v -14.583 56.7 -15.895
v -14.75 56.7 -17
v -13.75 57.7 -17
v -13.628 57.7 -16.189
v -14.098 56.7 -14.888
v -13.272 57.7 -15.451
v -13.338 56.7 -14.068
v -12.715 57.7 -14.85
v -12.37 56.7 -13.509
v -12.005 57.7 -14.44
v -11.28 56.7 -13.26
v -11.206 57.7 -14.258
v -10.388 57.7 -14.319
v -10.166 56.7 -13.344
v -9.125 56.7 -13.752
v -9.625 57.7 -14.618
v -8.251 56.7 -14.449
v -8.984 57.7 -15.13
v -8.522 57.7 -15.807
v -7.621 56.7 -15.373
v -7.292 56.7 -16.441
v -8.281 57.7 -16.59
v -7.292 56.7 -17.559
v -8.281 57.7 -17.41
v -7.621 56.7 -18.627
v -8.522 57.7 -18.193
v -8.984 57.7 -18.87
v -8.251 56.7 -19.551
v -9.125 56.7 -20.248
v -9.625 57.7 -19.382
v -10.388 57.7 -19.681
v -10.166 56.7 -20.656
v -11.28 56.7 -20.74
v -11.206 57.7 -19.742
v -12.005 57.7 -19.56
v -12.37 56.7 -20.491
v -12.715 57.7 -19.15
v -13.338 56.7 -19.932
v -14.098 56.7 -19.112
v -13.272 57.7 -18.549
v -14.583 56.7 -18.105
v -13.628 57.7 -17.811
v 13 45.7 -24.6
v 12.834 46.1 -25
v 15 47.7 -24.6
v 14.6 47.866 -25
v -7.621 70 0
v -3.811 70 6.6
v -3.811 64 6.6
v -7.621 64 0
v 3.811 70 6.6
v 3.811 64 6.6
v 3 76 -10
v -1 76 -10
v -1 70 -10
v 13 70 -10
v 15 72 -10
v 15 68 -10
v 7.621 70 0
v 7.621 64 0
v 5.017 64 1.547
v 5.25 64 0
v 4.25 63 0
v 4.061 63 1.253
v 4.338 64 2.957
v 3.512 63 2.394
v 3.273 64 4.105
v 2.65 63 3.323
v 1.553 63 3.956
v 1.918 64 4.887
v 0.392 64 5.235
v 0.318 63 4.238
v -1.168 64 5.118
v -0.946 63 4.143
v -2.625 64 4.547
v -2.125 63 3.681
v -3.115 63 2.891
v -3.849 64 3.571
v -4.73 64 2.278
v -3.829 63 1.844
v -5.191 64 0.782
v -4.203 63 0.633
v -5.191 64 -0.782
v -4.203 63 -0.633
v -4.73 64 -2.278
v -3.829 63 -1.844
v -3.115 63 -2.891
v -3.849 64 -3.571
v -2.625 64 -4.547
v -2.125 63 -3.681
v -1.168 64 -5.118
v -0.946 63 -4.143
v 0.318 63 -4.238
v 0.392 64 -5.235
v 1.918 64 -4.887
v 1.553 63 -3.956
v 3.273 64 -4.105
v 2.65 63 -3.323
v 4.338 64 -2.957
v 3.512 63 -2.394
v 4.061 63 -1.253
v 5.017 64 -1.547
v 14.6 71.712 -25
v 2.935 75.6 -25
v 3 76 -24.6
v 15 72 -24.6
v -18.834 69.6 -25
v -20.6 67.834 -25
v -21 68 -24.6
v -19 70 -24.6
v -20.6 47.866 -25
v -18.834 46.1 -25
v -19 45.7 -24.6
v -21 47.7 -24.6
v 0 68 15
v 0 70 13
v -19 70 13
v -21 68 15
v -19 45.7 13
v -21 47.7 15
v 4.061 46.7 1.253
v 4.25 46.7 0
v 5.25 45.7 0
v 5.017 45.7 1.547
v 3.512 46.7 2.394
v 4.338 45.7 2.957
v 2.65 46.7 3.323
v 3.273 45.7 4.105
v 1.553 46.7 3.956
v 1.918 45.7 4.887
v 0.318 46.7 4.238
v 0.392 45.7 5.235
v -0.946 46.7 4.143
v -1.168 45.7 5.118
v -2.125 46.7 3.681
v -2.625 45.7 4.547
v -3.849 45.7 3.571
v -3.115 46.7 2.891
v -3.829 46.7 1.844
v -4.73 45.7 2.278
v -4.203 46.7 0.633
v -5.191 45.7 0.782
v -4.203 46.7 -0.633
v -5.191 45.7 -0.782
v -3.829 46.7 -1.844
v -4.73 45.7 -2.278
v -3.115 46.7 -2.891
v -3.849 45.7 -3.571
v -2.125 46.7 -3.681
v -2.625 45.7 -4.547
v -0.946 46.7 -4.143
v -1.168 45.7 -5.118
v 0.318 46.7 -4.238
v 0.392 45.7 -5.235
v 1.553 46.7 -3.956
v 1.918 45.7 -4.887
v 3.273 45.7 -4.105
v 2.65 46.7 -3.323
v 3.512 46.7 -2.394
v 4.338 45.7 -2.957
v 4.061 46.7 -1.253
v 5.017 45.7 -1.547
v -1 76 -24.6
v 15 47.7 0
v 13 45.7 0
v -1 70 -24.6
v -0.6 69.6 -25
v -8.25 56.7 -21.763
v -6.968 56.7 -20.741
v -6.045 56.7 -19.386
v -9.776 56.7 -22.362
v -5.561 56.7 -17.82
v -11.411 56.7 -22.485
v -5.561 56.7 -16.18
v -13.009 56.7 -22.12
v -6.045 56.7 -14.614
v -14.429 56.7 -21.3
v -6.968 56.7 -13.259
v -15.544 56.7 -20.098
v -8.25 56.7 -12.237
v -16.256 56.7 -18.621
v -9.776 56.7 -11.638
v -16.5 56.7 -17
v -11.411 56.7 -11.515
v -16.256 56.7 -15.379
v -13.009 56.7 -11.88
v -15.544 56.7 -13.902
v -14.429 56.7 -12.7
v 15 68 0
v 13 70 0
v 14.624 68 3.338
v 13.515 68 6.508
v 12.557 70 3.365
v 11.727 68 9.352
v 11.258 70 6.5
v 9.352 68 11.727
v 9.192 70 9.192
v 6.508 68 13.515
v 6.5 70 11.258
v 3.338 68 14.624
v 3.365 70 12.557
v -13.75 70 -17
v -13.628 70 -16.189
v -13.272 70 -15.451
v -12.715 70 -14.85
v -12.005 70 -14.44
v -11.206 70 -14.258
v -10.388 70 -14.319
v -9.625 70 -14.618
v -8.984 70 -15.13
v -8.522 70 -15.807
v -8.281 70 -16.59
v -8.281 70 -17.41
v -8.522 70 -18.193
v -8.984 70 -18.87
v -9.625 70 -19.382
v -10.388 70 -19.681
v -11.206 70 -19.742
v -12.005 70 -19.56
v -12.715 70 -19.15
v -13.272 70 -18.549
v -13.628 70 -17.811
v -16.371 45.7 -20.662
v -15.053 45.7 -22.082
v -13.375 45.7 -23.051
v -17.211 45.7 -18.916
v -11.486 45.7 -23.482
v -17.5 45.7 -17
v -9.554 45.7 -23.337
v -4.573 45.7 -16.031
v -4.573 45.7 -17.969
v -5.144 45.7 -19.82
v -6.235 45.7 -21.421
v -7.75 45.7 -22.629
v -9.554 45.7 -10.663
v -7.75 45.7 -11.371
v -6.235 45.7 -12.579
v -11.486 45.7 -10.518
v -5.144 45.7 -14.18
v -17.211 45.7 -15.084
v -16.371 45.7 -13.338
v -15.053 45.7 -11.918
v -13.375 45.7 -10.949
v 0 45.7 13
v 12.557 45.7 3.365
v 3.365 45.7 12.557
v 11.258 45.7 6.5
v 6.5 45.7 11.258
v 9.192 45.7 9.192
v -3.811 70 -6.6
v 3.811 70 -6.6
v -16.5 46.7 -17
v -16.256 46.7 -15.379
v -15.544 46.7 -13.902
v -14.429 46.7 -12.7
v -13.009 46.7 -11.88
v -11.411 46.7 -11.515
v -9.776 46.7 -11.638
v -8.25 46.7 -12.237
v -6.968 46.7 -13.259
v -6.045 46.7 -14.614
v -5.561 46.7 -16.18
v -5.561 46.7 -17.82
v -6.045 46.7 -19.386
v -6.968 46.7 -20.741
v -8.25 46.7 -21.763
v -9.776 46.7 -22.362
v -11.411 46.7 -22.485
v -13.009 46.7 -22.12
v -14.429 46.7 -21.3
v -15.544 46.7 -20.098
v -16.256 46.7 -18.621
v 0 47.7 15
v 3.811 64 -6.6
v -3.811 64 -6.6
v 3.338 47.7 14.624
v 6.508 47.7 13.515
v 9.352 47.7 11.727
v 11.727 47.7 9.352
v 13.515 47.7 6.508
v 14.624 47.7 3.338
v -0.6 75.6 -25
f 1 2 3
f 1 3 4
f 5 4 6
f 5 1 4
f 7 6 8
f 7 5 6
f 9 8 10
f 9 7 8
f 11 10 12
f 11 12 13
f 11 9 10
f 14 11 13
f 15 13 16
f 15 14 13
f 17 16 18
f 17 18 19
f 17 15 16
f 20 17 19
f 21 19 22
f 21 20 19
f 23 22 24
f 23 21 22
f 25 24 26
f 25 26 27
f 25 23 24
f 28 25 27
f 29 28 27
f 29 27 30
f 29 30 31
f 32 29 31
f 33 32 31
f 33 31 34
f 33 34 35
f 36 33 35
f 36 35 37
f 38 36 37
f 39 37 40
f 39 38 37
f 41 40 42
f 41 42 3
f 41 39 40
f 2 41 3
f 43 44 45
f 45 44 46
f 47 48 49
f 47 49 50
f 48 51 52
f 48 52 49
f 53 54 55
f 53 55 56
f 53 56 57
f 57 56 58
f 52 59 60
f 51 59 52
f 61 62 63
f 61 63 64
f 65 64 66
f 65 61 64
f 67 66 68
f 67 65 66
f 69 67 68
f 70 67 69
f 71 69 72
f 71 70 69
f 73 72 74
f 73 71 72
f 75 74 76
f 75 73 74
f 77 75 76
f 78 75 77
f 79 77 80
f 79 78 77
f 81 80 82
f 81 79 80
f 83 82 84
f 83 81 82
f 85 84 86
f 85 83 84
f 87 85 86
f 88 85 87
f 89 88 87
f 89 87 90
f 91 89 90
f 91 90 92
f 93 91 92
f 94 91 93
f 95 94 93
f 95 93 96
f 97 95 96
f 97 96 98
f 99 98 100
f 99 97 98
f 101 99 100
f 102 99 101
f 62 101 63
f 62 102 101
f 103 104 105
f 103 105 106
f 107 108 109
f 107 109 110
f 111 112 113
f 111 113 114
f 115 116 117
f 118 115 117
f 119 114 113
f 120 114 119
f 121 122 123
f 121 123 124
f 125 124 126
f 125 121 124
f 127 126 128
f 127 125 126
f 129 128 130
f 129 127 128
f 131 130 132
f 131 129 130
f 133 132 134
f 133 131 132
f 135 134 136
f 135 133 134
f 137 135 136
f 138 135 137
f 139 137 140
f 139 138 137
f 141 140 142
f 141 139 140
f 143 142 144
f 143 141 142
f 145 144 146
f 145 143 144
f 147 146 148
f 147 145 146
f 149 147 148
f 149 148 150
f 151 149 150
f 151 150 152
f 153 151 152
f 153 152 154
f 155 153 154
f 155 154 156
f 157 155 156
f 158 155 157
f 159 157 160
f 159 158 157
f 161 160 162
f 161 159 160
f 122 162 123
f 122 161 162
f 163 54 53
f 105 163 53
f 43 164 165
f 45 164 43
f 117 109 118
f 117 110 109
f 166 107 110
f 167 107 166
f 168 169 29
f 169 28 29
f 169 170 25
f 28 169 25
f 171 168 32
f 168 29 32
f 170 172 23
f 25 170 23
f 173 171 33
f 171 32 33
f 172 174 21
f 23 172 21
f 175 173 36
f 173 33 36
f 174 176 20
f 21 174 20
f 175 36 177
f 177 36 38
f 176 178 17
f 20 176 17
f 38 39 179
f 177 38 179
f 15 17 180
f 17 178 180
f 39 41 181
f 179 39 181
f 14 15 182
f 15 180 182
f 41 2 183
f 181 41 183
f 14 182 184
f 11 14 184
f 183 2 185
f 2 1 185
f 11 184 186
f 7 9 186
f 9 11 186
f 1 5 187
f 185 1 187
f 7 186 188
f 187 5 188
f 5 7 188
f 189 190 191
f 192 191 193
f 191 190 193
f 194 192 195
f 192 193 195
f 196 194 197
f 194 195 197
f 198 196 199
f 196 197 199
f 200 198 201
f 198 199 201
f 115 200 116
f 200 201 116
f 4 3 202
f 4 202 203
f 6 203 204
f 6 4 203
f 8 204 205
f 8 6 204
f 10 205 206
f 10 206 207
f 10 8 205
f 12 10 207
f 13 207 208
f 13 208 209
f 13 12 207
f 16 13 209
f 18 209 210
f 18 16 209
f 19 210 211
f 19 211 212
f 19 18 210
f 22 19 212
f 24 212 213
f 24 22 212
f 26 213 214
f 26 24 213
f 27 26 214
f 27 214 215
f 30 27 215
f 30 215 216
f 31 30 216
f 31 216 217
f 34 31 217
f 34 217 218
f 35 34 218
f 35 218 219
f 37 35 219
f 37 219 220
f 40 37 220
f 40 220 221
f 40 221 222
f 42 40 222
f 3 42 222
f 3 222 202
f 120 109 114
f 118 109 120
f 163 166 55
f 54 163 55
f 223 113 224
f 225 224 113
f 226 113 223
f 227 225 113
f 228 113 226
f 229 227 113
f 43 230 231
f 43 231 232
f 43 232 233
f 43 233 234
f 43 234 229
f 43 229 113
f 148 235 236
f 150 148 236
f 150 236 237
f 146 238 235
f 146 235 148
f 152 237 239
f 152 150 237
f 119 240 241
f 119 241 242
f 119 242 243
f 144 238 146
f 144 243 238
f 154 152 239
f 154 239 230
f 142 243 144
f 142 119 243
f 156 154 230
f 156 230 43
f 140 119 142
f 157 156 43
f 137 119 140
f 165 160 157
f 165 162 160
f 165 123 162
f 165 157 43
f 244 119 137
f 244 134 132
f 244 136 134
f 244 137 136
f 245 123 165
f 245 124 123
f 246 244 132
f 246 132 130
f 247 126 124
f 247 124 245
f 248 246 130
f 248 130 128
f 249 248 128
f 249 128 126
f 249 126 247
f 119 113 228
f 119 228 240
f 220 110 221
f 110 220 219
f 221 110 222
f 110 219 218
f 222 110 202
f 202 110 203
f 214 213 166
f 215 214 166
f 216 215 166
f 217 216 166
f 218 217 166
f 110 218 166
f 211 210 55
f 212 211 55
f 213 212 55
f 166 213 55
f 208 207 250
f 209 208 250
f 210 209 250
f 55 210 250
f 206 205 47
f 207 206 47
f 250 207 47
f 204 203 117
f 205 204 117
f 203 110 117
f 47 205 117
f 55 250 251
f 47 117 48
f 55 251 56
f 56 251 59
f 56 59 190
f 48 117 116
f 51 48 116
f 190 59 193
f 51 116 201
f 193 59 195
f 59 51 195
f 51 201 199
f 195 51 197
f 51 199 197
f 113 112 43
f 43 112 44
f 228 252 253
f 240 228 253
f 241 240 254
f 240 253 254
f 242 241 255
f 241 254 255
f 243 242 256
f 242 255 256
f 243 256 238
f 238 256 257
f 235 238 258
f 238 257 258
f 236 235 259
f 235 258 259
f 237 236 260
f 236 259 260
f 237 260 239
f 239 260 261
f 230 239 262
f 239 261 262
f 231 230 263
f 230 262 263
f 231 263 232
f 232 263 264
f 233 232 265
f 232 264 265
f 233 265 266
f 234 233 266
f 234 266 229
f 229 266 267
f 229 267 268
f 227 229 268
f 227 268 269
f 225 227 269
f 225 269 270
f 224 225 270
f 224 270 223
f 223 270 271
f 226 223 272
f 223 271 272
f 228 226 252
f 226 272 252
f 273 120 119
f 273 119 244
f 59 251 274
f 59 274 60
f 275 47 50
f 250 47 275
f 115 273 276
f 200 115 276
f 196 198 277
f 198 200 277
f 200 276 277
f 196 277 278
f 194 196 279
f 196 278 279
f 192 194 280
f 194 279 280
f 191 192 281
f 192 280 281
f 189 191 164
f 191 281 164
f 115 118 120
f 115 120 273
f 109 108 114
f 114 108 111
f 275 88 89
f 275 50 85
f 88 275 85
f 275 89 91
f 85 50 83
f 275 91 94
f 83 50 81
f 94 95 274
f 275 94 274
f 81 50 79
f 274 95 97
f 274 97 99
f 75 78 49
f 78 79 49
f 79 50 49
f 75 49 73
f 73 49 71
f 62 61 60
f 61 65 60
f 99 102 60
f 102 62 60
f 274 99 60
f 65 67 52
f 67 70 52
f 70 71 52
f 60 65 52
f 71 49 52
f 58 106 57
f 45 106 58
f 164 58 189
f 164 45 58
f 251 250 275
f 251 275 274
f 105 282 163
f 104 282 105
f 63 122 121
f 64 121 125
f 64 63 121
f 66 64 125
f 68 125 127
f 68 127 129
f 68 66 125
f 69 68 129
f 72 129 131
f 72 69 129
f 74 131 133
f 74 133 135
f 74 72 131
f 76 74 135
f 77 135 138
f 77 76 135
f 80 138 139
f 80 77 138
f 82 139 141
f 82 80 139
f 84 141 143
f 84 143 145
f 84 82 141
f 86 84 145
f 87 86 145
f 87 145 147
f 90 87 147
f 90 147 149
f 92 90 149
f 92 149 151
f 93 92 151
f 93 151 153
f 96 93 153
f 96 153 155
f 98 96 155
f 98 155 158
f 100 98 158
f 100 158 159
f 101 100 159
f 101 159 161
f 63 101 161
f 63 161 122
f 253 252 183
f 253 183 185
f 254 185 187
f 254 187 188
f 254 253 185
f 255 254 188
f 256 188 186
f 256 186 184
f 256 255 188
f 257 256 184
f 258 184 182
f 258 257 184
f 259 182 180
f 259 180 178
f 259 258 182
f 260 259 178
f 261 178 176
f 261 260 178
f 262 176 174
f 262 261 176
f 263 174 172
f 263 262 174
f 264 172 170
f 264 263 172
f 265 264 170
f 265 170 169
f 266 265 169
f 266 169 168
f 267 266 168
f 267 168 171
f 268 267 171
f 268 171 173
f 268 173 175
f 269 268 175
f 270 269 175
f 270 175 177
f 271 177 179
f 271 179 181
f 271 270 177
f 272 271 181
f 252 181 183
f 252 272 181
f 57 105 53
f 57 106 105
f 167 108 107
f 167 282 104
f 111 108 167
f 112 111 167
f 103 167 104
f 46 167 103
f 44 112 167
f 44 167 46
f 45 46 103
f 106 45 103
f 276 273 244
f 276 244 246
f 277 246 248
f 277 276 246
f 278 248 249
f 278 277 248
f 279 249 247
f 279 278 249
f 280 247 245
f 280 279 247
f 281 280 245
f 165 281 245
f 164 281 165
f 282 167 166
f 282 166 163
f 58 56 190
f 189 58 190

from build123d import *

# Parameters (mm, degrees)
SKETCH087_W      = 36
SKETCH087_H      = 40
SKETCH087_R      = 4.25
PAD039_DEPTH     = 24.3
FILLET015_R      = 15
POCKET045_DEPTH  = 6
CHAMFER040_SIZE  = 1
SKETCH089_W      = 16
SKETCH089_H      = 15
PAD040_DEPTH     = 6
CHAMFER041_SIZE2 = 4
CHAMFER041_SIZE  = 12
SKETCH090_R      = 2.75
POCKET046_DEPTH  = 40
SKETCH091_R      = 5.5
POCKET047_DEPTH  = 11
CHAMFER042_SIZE  = 1
CHAMFER043_SIZE  = 2
CHAMFER044_SIZE  = 0.4


with BuildPart() as bloclaterallinear:
    # Sketch087 → Pad039 (new body)
    with BuildSketch(Plane.XZ):
        with Locations((-3, -5)):
            Rectangle(SKETCH087_W, SKETCH087_H)
        Circle(SKETCH087_R, mode=Mode.SUBTRACT)
    extrude(amount=-PAD039_DEPTH)

    # Fillet015
    fillet015_edges = [bloclaterallinear.edges().sort_by_distance(p)[0] for p in [
        (15, 12.15, 15),
    ]]
    fillet(fillet015_edges, radius=FILLET015_R)

    # Sketch088 (on Face2 of Fillet015) → Pocket045 (cut)
    with BuildSketch(Plane.XZ):
        Polygon((7.621024, 0), (3.810512, 6.6), (-3.810512, 6.6), (-7.621024, 0), (-3.810512, -6.6), (3.810512, -6.6), align=None)
    extrude(amount=-POCKET045_DEPTH, mode=Mode.SUBTRACT)

    # Chamfer040
    chamfer040_edges = [bloclaterallinear.edges().sort_by_distance(p)[0] for p in [
        (-4.25, 6, 0),
    ]]
    chamfer(chamfer040_edges, length=CHAMFER040_SIZE)

    # Sketch089 (on Face16 of Chamfer040) → Pad040 (join)
    with BuildSketch(Plane.XZ):
        with Locations((7, -17.5)):
            Rectangle(SKETCH089_W, SKETCH089_H)
    extrude(amount=PAD040_DEPTH)

    # Chamfer041
    chamfer041_edges = [bloclaterallinear.edges().sort_by_distance(p)[0] for p in [
        (15, -6, -17.5),
    ]]
    chamfer041_side = bloclaterallinear.faces().sort_by_distance((7, -6, -17.5))[0]
    chamfer(chamfer041_edges, length=CHAMFER041_SIZE, length2=CHAMFER041_SIZE2, reference=chamfer041_side)

    # Sketch090 (on Face9 of Chamfer041) → Pocket046 (cut)
    with BuildSketch(Plane(origin=(0, 24.3, 0), x_dir=(-1, 0, 0), z_dir=(0, 1, 0))):
        with Locations((11, -17)):
            Circle(SKETCH090_R)
    extrude(amount=-POCKET046_DEPTH, mode=Mode.SUBTRACT)

    # Sketch091 (on Face9 of Pocket046) → Pocket047 (cut)
    with BuildSketch(Plane(origin=(0, 24.3, 0), x_dir=(-1, 0, 0), z_dir=(0, 1, 0))):
        with Locations((11, -17)):
            Circle(SKETCH091_R)
    extrude(amount=-POCKET047_DEPTH, mode=Mode.SUBTRACT)

    # Chamfer042
    chamfer042_edges = [bloclaterallinear.edges().sort_by_distance(p)[0] for p in [
        (-5.5, 24.3, -17),
        (-4.25, 24.3, 0),
        (-8.25, 13.3, -17),
    ]]
    chamfer(chamfer042_edges, length=CHAMFER042_SIZE)

    # Chamfer043
    chamfer043_edges = [bloclaterallinear.edges().sort_by_distance(p)[0] for p in [
        (-21, 0, -5),
        (-21, 24.3, -5),
        (-10.5, 24.3, 15),
        (15, 0, -5),
    ]]
    chamfer(chamfer043_edges, length=CHAMFER043_SIZE)

    # Chamfer044
    chamfer044_edges = [bloclaterallinear.edges().sort_by_distance(p)[0] for p in [
        (15, 10.15, -25),
        (14, 23.3, -25),
        (9, -4, -25),
        (-3, 24.3, -25),
        (1, -6, -25),
        (-20, 23.3, -25),
        (-1, -3, -25),
        (-21, 12.15, -25),
        (-10, 0, -25),
        (-20, 1, -25),
    ]]
    chamfer(chamfer044_edges, length=CHAMFER044_SIZE)


with BuildPart() as bloclaterallinear_1:
    # Body024 placement: moved
    add(bloclaterallinear.part.moved(Location((0, -70, 0))))


with BuildPart() as part_mirroring004:
    # Part__Mirroring004: instance of BlocLateralLinear
    add(bloclaterallinear_1.part.mirror(Plane(origin=(0, 0, 0), x_dir=(1, 0, 0), z_dir=(0, 1, 0))))


solid = part_mirroring004.part
